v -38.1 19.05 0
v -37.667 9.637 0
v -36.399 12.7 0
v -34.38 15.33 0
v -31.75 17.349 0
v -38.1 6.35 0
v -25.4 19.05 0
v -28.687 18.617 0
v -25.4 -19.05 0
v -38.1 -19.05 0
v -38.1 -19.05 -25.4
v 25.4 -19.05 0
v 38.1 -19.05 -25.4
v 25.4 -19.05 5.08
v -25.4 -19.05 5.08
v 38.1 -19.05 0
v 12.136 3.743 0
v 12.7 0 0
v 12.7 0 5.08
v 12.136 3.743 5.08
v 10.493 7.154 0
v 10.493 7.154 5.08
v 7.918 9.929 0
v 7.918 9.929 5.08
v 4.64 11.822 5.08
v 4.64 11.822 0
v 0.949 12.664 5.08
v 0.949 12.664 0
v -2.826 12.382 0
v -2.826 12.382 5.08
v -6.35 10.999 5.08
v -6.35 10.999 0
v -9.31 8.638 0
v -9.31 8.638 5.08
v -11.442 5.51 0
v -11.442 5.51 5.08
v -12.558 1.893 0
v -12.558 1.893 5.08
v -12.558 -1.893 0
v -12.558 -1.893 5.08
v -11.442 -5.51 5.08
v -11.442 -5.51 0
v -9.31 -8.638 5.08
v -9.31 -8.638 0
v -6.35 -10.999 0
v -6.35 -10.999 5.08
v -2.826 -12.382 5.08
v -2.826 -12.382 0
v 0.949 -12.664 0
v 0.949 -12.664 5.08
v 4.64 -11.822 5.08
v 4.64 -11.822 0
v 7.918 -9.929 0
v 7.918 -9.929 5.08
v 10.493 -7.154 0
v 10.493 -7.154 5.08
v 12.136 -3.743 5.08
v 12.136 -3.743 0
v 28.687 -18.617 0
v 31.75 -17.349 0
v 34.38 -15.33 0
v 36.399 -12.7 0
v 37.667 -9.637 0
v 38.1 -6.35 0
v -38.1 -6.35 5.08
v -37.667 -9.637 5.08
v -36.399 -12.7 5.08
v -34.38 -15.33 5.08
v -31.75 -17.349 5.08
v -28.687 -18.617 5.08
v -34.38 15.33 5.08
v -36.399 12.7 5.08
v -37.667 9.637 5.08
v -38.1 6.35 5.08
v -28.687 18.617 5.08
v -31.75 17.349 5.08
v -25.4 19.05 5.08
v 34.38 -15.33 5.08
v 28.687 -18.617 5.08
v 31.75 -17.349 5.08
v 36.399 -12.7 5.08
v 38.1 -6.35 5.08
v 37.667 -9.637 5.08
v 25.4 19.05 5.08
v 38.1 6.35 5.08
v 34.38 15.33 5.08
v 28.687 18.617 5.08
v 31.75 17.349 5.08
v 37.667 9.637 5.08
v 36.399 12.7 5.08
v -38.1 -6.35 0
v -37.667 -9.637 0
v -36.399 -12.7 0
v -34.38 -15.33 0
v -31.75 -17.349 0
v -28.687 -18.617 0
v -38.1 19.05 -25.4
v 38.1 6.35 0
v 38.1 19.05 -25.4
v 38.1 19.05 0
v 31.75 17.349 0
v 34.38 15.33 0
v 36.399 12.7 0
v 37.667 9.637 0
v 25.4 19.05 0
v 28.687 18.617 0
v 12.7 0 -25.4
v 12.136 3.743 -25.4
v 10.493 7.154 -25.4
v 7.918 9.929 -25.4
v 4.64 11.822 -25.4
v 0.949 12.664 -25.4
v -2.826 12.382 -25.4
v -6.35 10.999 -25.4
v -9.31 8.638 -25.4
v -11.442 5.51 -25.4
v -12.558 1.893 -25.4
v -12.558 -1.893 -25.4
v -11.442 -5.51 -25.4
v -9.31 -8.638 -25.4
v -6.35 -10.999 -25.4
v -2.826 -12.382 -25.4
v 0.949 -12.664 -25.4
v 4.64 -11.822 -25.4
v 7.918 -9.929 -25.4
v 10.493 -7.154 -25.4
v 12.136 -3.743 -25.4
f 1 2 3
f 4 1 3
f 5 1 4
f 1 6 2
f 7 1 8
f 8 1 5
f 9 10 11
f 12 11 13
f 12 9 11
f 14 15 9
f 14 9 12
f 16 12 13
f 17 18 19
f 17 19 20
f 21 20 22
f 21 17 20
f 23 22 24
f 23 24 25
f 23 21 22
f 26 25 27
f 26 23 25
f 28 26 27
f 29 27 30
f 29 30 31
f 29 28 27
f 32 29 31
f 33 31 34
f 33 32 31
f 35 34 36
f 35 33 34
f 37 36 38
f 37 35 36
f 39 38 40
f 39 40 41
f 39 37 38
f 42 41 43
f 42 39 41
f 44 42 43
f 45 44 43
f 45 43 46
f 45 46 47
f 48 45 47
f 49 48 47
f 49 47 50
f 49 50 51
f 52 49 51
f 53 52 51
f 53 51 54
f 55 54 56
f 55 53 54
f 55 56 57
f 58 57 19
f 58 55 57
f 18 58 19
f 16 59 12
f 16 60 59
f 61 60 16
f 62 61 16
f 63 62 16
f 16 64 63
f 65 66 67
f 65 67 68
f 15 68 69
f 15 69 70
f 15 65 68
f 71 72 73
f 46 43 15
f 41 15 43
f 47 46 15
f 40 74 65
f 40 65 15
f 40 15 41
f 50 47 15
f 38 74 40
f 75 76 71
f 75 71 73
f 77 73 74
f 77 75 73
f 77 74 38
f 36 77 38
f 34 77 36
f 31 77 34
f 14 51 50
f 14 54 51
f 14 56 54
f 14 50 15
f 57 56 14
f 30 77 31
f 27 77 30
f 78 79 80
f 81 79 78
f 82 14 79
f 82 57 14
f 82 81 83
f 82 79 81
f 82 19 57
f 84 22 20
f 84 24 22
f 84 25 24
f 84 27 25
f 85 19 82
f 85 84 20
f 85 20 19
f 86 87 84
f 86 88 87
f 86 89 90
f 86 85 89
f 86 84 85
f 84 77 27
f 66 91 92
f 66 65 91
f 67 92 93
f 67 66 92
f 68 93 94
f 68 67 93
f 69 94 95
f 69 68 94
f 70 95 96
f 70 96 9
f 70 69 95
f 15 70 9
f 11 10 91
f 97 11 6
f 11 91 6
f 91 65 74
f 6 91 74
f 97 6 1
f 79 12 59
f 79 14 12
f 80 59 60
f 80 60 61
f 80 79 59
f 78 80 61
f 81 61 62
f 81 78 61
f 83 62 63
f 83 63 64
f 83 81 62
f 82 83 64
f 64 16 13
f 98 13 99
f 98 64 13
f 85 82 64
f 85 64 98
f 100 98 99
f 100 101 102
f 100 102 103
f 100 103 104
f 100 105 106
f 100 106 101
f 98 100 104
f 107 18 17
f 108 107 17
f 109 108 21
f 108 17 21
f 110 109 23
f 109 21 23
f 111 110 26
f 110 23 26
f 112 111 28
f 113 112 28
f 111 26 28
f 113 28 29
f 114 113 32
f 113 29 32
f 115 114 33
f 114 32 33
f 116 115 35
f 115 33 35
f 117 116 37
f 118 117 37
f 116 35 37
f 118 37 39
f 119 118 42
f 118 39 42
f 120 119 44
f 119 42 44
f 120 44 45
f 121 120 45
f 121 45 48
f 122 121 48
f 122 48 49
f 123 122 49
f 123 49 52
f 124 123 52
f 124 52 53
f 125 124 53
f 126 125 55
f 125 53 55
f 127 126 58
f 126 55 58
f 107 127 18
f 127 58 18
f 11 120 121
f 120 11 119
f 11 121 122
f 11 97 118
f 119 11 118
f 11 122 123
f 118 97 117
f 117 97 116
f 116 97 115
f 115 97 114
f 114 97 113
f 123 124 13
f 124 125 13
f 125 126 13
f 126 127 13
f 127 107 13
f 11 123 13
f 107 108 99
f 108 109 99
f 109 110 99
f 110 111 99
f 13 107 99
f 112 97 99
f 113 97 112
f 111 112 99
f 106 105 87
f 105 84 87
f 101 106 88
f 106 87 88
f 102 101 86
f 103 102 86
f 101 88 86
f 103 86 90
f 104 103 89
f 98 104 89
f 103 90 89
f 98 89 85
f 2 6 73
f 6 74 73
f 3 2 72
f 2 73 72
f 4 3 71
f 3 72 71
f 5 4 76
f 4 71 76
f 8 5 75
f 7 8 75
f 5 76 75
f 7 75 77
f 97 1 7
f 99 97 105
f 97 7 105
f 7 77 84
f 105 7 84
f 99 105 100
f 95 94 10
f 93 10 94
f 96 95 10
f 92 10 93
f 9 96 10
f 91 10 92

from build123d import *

# Parameters (mm, degrees)
F1_W     = 76.2
F1_H     = 38.1
F1_R     = 12.7
F2_DEPTH = 5.08
F3_R     = 12.7
F4_DEPTH = 25.4


# Not quite as in the source:
# - a variable given as a bare number and used for a length is read in inches; the dataset says mm whatever the document's units were


with BuildPart() as f2:
    # F1 (on Top) → F2 (new body)
    with BuildSketch(Plane.XY):
        Rectangle(F1_W, F1_H)
        Circle(F1_R, mode=Mode.SUBTRACT)
    extrude(amount=F2_DEPTH)

    # F3
    f3_edges = [f2.edges().sort_by_distance(p)[0] for p in [
        (38.1, -19.05, 2.54),
        (38.1, 19.05, 2.54),
        (-38.1, -19.05, 2.54),
        (-38.1, 19.05, 2.54),
    ]]
    fillet(f3_edges, radius=F3_R)

    # F1 (on Top) → F4 (join)
    with BuildSketch(Plane.XY):
        Rectangle(F1_W, F1_H)
        Circle(F1_R, mode=Mode.SUBTRACT)
    extrude(amount=-F4_DEPTH)


solid = f2.part
